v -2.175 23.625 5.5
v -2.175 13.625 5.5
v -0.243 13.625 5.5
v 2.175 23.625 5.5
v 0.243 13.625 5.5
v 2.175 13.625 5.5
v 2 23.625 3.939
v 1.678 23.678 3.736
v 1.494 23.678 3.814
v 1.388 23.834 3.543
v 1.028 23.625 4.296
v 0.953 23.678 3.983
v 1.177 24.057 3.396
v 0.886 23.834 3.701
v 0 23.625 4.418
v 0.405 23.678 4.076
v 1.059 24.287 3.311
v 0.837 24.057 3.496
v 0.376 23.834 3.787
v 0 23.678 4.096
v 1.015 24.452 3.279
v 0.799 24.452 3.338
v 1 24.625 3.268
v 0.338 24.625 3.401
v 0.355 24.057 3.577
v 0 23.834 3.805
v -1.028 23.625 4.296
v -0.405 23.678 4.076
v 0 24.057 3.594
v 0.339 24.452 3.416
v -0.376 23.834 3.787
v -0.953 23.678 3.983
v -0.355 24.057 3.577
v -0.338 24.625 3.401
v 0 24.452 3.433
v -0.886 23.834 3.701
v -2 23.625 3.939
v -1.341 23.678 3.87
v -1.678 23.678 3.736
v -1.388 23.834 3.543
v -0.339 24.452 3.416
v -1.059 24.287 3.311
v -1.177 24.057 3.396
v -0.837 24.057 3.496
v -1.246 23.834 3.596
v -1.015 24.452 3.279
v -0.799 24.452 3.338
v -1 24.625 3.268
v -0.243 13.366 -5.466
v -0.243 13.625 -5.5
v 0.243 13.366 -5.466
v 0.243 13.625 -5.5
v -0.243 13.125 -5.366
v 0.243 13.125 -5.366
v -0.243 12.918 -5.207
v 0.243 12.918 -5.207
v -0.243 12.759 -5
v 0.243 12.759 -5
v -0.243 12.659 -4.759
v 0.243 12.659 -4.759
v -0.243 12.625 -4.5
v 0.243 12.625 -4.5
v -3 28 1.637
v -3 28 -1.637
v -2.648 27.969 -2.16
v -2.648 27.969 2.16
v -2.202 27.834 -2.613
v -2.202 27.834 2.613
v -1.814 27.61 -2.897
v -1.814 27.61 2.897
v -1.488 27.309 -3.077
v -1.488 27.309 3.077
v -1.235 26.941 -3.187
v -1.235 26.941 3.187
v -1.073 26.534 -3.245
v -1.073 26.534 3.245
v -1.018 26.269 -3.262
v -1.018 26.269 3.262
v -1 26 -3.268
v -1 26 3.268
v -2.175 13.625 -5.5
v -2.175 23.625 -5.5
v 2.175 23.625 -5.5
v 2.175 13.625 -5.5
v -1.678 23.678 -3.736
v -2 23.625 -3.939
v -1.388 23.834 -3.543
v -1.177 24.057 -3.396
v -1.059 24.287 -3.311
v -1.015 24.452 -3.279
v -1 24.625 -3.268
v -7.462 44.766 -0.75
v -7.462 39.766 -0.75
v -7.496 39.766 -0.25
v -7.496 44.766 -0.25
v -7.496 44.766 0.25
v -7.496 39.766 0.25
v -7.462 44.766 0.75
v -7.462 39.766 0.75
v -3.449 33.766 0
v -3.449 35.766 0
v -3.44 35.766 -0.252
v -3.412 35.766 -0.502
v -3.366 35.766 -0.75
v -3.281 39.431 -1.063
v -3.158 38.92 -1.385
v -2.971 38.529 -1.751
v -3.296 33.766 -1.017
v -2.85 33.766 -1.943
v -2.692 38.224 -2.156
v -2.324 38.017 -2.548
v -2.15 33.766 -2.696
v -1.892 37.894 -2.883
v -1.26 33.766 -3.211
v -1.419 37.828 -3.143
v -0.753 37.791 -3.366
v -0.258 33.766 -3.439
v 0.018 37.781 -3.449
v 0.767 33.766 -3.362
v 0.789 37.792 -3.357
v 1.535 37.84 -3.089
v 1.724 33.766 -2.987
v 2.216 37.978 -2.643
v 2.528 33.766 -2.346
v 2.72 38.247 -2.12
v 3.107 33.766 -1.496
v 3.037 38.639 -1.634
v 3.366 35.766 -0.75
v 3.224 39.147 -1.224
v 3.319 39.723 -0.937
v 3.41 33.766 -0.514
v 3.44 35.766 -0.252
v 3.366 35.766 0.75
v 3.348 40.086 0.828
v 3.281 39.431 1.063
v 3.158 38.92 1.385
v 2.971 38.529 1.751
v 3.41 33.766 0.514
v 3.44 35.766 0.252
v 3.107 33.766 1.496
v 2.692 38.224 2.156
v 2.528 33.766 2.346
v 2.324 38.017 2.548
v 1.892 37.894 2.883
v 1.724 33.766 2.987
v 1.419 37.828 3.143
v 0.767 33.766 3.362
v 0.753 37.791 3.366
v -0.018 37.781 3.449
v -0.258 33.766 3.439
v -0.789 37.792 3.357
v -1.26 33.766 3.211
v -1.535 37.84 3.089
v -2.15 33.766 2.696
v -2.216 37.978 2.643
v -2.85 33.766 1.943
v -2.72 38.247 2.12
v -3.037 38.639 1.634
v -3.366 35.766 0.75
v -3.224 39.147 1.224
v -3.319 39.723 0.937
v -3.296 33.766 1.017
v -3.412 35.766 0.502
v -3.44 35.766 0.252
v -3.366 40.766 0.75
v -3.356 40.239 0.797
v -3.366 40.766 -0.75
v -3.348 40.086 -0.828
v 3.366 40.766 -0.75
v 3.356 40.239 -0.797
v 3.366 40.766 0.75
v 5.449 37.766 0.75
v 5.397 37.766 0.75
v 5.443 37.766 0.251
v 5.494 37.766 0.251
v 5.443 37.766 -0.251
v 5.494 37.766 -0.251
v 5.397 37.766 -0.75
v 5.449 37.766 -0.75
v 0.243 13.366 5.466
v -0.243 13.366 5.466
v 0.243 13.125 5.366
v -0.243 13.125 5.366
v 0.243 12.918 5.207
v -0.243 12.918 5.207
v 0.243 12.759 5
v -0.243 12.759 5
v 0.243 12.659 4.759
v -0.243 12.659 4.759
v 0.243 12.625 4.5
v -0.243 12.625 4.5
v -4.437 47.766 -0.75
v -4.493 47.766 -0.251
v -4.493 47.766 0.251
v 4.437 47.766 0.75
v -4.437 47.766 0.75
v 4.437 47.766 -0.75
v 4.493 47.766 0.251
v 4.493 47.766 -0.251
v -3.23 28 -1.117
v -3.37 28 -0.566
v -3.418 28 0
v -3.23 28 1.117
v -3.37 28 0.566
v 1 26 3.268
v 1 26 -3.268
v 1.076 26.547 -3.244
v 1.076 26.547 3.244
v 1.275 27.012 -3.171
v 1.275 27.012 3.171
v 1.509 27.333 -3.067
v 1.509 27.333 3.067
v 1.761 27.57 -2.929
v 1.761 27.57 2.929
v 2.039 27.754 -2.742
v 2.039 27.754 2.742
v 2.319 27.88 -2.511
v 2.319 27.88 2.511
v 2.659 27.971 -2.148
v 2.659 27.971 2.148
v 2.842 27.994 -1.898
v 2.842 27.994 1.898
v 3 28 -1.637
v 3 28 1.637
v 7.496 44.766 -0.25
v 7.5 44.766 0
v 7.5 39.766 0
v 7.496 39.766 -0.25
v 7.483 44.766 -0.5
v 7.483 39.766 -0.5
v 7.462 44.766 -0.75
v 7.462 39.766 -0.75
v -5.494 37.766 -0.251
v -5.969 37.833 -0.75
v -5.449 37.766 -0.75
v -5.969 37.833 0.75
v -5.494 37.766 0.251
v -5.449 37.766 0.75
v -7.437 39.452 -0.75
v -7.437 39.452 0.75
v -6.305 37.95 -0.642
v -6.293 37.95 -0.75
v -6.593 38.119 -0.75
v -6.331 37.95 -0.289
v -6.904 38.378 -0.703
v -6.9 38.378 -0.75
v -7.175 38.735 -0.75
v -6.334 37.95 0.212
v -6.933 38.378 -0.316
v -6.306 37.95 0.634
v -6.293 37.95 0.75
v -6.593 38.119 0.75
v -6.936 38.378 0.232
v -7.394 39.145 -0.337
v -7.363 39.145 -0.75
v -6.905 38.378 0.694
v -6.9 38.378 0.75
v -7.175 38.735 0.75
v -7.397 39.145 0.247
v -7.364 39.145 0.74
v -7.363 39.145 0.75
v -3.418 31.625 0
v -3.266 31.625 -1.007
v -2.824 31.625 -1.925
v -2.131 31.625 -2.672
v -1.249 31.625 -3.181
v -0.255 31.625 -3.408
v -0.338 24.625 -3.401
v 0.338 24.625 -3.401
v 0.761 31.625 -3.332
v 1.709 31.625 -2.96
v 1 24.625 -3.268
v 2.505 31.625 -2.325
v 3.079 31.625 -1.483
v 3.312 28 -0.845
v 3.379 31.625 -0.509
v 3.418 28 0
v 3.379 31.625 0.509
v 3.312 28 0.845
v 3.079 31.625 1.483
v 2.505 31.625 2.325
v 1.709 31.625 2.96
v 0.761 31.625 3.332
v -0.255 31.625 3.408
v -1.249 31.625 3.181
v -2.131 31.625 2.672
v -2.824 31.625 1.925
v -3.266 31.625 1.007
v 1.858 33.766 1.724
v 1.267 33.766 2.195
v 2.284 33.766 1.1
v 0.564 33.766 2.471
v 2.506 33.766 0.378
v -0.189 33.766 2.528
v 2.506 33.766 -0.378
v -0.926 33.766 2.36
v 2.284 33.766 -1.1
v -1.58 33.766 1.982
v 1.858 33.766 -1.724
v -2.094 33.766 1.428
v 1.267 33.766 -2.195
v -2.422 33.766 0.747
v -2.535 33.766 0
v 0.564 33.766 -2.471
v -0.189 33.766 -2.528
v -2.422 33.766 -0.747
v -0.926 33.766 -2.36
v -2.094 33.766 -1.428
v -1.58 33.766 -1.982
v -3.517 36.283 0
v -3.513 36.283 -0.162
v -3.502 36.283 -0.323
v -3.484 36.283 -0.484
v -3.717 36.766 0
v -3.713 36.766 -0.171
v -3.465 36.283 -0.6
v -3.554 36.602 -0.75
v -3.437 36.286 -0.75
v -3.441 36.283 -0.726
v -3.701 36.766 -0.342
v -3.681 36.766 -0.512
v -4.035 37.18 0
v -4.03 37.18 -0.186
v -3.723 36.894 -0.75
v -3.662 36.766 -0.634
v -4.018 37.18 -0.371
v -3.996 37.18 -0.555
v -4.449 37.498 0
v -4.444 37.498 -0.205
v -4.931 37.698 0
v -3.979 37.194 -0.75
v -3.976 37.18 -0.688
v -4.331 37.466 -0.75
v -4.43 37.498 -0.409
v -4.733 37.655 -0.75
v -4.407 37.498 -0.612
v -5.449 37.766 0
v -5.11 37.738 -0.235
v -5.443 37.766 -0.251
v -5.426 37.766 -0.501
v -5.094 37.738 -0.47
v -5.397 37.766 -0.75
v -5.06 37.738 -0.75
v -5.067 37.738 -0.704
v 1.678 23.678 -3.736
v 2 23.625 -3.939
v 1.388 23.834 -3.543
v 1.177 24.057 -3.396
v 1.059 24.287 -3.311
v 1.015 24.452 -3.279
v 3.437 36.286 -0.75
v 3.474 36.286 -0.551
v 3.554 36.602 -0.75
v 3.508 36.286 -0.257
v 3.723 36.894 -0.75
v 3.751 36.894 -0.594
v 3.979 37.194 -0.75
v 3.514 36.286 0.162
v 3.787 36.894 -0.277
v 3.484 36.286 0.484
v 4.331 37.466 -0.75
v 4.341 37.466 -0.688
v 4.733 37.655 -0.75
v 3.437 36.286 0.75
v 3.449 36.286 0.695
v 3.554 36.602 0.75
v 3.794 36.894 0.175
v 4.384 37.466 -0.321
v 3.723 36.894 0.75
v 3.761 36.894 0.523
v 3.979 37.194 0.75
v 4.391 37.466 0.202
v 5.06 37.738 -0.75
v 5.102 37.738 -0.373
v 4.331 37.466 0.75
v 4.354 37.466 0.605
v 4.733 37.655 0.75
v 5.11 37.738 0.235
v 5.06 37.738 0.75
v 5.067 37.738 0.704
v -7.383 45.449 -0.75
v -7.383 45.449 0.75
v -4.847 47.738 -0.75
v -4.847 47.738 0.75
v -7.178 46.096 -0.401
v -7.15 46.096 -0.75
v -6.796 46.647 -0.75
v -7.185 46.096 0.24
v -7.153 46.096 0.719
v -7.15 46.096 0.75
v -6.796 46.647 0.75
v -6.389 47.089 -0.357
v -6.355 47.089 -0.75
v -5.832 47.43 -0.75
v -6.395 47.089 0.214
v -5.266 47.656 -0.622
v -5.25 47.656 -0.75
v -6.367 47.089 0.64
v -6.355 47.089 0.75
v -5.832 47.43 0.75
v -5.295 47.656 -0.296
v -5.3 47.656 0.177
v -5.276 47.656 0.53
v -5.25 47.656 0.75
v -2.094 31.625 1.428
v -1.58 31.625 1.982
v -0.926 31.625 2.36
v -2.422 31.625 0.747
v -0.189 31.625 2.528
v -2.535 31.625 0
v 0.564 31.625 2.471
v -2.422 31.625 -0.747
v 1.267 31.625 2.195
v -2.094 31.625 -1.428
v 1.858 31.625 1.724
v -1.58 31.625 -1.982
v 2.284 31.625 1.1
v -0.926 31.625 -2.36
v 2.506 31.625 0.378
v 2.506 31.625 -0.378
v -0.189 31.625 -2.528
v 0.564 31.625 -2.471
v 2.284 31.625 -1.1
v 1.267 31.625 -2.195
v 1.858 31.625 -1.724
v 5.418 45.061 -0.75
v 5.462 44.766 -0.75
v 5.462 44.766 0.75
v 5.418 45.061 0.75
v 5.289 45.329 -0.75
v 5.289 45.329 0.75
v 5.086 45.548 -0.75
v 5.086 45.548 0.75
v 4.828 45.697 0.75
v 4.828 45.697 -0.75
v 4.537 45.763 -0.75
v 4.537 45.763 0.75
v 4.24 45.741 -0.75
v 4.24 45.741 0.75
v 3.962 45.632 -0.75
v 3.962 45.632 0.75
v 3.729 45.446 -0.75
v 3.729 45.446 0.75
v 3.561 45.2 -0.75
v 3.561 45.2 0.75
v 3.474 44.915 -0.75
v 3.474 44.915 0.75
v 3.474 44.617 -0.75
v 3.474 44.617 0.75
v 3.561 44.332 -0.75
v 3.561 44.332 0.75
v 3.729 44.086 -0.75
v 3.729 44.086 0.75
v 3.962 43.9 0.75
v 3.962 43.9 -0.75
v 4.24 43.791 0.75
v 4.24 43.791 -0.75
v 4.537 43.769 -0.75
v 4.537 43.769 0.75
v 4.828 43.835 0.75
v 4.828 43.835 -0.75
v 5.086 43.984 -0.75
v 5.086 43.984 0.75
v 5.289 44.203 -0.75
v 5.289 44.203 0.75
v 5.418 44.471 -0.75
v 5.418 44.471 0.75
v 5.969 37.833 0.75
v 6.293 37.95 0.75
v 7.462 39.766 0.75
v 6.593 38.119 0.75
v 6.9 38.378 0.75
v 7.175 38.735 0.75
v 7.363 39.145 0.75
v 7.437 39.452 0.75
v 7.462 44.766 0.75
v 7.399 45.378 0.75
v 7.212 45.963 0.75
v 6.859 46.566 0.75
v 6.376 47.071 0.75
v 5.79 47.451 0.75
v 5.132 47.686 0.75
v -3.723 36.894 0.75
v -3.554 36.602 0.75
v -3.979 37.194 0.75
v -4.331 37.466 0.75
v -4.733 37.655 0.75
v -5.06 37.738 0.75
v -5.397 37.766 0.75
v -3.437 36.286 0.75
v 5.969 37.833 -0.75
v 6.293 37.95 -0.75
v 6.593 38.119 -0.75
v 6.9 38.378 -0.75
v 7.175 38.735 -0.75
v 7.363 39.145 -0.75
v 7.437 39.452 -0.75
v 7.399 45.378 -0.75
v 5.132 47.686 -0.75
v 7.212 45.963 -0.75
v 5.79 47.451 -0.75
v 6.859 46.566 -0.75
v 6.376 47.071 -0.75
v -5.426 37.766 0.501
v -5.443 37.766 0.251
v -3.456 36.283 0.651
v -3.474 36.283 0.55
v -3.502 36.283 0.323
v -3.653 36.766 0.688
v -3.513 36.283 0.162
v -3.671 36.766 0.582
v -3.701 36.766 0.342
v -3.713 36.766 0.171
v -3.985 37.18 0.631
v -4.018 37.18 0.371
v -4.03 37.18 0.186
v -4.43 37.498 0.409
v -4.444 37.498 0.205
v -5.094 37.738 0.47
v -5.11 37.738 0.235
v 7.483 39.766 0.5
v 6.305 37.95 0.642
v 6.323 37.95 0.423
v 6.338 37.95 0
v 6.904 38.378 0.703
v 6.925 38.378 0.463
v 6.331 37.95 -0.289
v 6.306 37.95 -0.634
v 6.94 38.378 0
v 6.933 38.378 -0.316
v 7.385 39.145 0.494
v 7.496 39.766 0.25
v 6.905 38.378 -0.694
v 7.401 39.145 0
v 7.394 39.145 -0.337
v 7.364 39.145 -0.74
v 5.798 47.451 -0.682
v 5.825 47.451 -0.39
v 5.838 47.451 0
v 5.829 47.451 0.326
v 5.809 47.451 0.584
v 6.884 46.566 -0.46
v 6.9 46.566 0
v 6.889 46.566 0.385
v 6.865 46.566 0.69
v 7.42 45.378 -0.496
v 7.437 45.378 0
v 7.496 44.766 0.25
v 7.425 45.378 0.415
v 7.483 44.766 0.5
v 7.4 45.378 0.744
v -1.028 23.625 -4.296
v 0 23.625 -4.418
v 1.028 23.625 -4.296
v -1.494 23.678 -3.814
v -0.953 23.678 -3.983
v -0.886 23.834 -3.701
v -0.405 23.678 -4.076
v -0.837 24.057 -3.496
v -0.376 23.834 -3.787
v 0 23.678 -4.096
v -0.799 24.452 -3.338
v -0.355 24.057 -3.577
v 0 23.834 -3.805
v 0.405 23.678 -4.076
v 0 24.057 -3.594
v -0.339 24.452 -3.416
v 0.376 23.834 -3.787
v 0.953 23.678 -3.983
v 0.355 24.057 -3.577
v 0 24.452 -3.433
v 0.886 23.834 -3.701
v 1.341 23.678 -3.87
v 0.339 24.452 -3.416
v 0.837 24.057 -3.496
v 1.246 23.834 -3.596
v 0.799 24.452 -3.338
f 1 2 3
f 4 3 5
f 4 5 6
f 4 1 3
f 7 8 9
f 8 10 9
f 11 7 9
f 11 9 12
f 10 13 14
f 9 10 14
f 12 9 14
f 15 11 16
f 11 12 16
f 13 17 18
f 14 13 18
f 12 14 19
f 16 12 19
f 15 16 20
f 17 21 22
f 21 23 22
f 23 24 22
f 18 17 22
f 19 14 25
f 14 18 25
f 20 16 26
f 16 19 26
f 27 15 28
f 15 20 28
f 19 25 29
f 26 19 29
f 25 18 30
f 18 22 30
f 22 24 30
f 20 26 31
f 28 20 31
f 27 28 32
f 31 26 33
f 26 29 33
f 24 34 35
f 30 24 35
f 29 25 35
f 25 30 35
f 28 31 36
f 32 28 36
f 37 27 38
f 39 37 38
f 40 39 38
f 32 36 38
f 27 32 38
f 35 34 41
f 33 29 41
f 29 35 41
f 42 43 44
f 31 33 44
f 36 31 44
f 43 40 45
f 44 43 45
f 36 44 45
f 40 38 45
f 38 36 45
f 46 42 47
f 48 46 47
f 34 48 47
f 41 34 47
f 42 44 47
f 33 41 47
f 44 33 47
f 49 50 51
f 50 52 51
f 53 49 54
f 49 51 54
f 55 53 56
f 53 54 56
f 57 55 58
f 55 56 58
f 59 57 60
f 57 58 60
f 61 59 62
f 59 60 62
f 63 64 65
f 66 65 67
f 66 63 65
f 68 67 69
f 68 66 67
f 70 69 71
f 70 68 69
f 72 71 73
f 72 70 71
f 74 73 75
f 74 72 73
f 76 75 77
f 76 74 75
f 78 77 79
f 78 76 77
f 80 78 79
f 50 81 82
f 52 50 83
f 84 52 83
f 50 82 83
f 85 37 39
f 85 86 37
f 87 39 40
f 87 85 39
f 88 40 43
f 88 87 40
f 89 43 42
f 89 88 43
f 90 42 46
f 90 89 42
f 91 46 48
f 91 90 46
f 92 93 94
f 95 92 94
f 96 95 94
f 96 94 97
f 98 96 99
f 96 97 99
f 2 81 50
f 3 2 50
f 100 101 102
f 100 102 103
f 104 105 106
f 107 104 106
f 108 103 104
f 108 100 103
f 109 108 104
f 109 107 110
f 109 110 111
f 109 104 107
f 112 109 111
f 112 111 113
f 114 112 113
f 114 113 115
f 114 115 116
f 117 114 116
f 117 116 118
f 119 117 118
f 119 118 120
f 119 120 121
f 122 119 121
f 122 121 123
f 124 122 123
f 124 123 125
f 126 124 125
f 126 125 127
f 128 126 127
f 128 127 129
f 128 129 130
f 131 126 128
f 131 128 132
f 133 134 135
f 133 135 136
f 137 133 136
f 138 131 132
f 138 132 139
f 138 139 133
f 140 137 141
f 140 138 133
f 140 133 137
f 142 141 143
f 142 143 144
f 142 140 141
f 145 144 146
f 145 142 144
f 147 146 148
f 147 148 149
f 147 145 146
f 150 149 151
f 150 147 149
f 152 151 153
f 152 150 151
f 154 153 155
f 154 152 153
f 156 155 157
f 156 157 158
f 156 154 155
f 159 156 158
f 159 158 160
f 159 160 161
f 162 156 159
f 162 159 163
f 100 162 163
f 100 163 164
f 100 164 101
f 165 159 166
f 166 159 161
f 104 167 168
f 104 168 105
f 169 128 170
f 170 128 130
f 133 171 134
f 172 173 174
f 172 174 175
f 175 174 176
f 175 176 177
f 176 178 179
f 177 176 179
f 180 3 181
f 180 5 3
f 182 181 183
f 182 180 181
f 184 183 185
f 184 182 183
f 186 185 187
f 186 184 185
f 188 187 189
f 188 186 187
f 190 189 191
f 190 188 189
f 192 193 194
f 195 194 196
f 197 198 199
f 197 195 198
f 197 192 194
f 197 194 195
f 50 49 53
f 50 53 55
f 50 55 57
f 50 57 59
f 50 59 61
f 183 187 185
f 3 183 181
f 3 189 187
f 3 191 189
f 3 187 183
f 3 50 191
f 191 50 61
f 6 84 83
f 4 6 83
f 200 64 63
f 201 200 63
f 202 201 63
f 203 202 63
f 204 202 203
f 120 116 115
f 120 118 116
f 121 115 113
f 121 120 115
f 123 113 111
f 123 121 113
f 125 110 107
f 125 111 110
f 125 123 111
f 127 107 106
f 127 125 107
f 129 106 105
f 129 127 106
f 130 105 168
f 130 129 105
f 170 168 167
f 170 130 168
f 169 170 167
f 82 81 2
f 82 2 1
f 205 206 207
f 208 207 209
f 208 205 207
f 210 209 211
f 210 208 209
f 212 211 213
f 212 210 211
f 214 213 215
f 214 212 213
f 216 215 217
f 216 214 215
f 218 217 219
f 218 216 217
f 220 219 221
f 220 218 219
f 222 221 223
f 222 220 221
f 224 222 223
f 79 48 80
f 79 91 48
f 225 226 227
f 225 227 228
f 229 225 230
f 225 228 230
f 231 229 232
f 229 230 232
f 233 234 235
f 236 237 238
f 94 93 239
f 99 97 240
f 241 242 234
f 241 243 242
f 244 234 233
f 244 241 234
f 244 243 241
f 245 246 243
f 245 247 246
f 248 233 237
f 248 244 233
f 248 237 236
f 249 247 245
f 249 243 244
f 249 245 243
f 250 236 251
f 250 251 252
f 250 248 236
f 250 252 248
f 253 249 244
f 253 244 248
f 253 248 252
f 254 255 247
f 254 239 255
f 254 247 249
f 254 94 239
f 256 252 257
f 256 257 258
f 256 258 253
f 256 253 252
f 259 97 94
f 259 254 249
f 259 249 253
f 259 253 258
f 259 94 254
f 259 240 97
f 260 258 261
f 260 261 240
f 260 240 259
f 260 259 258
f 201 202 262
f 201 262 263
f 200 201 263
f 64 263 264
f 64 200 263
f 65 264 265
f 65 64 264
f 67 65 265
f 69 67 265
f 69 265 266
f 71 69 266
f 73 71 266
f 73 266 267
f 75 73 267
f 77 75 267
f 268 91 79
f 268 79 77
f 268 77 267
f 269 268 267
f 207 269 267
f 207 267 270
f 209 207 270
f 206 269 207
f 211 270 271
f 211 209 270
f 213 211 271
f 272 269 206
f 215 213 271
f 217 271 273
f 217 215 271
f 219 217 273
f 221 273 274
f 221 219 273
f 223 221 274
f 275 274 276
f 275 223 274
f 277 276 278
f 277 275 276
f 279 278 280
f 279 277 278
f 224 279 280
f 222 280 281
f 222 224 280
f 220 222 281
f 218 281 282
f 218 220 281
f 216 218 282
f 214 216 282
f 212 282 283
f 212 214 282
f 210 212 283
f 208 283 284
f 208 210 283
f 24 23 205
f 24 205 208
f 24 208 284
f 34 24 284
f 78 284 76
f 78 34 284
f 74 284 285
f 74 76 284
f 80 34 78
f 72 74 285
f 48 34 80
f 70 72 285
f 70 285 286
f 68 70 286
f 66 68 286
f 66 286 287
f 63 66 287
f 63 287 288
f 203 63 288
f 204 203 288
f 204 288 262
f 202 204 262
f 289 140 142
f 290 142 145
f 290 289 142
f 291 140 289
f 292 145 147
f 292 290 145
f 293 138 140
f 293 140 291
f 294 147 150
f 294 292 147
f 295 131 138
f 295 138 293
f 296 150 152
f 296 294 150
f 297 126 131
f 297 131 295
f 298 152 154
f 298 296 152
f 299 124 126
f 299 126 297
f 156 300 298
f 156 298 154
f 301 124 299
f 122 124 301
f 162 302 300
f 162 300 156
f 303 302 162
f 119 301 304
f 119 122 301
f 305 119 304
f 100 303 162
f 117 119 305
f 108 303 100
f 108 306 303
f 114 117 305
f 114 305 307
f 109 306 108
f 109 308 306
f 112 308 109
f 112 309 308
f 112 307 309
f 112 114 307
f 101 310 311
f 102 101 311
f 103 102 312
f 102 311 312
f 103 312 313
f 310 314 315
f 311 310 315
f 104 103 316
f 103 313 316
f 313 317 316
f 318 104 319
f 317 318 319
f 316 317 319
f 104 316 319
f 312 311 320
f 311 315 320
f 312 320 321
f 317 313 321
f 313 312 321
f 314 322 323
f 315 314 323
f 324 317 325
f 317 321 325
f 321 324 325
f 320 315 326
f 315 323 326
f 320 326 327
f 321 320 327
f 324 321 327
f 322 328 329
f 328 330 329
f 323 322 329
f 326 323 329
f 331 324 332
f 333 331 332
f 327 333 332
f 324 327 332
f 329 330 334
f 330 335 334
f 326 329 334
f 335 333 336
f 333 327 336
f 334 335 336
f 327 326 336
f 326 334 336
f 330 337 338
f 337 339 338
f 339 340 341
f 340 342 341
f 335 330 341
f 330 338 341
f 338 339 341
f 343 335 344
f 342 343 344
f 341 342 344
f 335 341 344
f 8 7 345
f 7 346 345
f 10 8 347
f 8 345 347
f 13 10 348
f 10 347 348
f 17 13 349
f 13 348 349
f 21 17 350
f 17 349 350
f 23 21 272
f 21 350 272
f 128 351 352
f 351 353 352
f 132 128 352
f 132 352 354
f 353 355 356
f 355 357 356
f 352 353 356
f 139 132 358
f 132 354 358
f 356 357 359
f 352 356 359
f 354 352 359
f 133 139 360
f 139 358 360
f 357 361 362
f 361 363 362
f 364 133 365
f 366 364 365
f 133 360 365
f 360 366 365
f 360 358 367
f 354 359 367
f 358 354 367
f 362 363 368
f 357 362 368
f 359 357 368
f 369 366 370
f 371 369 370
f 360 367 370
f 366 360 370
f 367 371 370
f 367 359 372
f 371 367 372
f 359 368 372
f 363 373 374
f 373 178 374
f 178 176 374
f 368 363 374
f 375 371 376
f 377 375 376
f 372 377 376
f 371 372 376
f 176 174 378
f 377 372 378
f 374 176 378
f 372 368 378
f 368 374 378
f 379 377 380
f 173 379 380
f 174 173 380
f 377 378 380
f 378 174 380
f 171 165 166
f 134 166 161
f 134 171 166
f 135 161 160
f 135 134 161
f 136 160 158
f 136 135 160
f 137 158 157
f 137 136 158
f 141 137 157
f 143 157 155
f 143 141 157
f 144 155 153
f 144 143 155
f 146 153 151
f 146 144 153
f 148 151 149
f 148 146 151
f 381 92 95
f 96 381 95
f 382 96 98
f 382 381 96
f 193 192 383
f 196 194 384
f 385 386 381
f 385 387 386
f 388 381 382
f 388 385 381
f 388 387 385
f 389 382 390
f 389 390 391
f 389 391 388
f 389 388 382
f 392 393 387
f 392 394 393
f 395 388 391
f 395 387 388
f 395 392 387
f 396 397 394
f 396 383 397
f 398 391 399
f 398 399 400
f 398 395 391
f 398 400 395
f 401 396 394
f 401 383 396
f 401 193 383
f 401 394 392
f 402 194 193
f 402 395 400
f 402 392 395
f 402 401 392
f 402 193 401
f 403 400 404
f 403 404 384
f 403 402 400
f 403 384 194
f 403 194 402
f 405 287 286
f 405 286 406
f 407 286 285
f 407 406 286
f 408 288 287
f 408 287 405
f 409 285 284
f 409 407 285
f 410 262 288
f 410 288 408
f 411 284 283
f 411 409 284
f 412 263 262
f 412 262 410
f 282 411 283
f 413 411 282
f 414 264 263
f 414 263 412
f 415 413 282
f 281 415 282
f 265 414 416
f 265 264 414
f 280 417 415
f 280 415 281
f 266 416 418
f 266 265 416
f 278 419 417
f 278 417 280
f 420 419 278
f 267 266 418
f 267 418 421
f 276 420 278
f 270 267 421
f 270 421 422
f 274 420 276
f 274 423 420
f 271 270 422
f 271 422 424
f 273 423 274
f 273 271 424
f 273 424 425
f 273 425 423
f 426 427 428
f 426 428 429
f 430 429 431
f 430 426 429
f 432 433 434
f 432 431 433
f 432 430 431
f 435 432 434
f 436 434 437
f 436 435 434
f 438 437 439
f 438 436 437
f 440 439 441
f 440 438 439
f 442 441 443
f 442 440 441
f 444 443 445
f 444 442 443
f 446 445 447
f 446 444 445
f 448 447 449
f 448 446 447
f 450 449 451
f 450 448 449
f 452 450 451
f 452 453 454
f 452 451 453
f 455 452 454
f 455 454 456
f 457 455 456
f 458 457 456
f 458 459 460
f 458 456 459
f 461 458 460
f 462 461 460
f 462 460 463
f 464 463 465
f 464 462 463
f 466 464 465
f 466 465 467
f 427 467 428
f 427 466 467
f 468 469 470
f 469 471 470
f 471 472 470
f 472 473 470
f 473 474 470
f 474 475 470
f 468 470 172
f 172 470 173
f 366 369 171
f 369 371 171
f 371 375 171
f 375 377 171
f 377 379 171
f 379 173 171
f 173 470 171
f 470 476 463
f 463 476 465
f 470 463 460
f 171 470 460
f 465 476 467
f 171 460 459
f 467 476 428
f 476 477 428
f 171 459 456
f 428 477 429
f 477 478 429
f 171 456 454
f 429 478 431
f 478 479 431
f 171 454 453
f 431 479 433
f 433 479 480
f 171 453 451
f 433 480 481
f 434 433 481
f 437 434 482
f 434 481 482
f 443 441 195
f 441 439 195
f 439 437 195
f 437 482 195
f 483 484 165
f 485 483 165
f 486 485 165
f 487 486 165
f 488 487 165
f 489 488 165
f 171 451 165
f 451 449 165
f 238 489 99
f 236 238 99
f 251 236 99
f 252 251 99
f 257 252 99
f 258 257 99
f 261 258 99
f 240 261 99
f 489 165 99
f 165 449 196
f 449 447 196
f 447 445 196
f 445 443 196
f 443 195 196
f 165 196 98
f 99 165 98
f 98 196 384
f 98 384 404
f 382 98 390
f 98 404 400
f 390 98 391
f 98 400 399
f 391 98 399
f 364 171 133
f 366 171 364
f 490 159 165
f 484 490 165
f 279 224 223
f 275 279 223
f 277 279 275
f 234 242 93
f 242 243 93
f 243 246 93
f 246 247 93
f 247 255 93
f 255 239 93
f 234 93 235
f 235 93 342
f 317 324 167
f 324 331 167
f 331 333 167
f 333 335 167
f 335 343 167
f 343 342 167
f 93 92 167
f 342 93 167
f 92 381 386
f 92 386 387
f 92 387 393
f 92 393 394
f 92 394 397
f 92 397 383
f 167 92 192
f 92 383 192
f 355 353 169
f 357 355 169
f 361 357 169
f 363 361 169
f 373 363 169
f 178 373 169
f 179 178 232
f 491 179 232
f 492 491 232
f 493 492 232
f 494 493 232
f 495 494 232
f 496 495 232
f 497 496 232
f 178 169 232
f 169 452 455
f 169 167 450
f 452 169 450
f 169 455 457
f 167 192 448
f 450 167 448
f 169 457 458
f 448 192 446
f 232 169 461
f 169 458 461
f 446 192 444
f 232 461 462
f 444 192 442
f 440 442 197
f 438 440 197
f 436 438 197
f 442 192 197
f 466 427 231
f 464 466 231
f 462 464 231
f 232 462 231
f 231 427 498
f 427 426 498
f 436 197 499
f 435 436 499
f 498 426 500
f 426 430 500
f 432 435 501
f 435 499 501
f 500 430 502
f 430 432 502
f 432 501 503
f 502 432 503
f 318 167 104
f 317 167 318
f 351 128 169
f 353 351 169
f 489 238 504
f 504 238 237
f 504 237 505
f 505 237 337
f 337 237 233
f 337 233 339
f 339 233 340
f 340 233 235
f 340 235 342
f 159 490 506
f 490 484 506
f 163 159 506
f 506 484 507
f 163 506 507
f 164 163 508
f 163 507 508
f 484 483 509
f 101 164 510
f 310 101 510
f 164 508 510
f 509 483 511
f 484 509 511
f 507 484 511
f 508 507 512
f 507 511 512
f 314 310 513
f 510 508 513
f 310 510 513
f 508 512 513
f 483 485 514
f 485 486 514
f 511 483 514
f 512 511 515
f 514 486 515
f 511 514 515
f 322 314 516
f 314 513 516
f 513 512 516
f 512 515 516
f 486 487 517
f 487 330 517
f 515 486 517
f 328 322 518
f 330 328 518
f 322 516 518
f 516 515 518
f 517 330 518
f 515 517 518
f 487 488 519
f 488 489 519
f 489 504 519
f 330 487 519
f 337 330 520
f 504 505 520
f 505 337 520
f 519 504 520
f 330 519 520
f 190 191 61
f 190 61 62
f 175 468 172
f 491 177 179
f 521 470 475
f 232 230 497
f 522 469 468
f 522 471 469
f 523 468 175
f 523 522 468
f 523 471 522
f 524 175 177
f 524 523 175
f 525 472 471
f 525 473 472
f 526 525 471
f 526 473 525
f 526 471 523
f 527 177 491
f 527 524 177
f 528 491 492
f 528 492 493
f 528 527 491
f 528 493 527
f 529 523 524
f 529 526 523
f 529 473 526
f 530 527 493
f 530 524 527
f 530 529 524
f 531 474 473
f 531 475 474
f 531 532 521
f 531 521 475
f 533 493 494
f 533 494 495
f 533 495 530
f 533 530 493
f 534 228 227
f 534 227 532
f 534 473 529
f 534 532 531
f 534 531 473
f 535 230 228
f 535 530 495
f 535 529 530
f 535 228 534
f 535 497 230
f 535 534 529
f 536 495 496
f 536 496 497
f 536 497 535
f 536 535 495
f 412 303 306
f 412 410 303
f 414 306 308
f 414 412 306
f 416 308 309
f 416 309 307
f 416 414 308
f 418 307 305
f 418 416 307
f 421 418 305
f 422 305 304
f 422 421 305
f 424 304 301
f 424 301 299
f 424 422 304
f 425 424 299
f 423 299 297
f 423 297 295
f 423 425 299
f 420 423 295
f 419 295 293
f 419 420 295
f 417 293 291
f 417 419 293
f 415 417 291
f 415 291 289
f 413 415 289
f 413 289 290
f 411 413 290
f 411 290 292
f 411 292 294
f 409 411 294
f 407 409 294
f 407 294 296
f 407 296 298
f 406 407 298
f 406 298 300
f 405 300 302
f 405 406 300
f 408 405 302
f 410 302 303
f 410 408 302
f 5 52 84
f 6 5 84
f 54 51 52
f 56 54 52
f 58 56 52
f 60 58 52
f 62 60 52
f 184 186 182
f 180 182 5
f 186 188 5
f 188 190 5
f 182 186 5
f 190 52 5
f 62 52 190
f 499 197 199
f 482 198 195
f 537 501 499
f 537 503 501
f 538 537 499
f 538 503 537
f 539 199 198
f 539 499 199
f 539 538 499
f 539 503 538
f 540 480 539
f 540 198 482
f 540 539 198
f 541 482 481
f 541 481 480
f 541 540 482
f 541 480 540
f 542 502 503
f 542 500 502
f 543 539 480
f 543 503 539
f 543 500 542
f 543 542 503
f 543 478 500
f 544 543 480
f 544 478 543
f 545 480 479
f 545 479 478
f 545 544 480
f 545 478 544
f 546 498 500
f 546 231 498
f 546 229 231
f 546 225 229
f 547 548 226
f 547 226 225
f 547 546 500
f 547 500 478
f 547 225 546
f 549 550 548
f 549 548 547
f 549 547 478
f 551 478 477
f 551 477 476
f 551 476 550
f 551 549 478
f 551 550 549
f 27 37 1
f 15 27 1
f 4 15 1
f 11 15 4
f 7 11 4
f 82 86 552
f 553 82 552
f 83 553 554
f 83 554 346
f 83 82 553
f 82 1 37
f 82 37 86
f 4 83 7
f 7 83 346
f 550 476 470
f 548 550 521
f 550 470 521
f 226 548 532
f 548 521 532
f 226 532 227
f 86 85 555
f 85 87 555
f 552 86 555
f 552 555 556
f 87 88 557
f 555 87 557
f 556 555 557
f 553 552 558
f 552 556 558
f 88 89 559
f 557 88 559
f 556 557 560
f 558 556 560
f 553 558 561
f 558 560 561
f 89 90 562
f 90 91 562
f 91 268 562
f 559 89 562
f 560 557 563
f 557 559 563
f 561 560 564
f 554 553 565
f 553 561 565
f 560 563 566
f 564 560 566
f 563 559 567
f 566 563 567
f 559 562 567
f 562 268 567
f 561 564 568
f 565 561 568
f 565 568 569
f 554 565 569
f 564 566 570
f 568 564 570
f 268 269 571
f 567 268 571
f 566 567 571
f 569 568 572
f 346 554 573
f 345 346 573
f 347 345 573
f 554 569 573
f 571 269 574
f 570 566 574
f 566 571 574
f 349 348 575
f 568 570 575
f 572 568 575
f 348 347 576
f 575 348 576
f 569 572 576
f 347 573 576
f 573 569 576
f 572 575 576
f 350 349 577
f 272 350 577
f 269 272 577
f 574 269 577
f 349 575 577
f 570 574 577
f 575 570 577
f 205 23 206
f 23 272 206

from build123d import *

# Parameters (mm, degrees)
BOSS_EXTRUDE1_DEPTH      = 10
FILLET2_R                = 2
FILLET3_R                = 3
CUT_EXTRUDE1_DEPTH       = 49.473897211
CUT_EXTRUDE1_DEPTH_BACK  = 49.473897211
SKETCH3_R                = 1
CUT_EXTRUDE2_DEPTH       = 49.473897211
CUT_EXTRUDE2_DEPTH_BACK  = 49.473897211
SKETCH4_W                = 5.555619824
SKETCH4_H                = 11.886700215
SKETCH4_W_2              = 4.837610552
SKETCH4_H_2              = 13.886700215
FILLET4_R                = 2
BOSS_EXTRUDE2_DEPTH      = 5.5
BOSS_EXTRUDE2_DEPTH_BACK = 5.5
SKETCH7_W                = 4.35
SKETCH7_H                = 10
FILLET5_R                = 1
SKETCH8_W                = 0.486068648
SKETCH8_H                = 11
BOSS_EXTRUDE3_DEPTH      = 1
FILLET6_R                = 1


with BuildPart() as part:
    # Sketch1 → Revolve1 (revolve)
    with BuildSketch(Plane.XY):
        Polygon((-3.448914015, 37.765821371), (-3.448914015, 33.765821371), (-2.534753992, 33.765821371), (-2.534753992, 31.624967984), (-3.41766068, 31.624967984), (-3.41766068, 23), (0, 23), (0, 37.765821371), align=None)
    revolve(axis=Axis((0, 37.765821371, 0), (0, -1, 0)))

    # Sketch2 → Boss-Extrude1 (add)
    with BuildSketch(Plane(origin=(0, 37.765821371, 0), x_dir=(1, 0, 0), z_dir=(0, 1, 0))):
        with BuildLine():
            Line((3.366379046, 0.75), (-3.366379046, 0.75))
            ThreePointArc((-3.366379046, 0.75), (-3.448914015, 0), (-3.366379046, -0.75))
            Line((-3.366379046, -0.75), (3.366379046, -0.75))
            ThreePointArc((3.366379046, -0.75), (3.428218178, -0.37726384), (3.448914015, 0))
            ThreePointArc((3.448914015, 0), (3.428218178, 0.37726384), (3.366379046, 0.75))
        make_face()
        with BuildLine():
            Line((-3.366379046, 0.75), (-7.462405778, 0.75))
            ThreePointArc((-7.462405778, 0.75), (-7.5, 0), (-7.462405778, -0.75))
            Line((-7.462405778, -0.75), (-3.366379046, -0.75))
            ThreePointArc((-3.366379046, -0.75), (-3.448914015, 0), (-3.366379046, 0.75))
        make_face()
        with BuildLine():
            ThreePointArc((7.5, 0), (7.490595548, 0.375470813), (7.462405778, 0.75))
            Line((7.462405778, 0.75), (3.366379046, 0.75))
            ThreePointArc((3.366379046, 0.75), (3.428218178, 0.37726384), (3.448914015, 0))
            ThreePointArc((3.448914015, 0), (3.428218178, -0.37726384), (3.366379046, -0.75))
            Line((3.366379046, -0.75), (7.462405778, -0.75))
            ThreePointArc((7.462405778, -0.75), (7.490595548, -0.375470813), (7.5, 0))
        make_face()
    extrude(amount=BOSS_EXTRUDE1_DEPTH)

    # Fillet2
    # the kernel refuses this fillet: 2 mm, written as the material it adds along each edge
    with BuildSketch(Plane(origin=(0, 37.765821371, 0), x_dir=(-0.09803421101524086, 0, -0.9951830452085783), z_dir=(-0.9951830452085783, 0, 0.09803421101524086))) as fillet2_piece_1_section:
        with BuildLine():
            CenterArc((3.448914015 + FILLET2_R, FILLET2_R), FILLET2_R, 180, 90)
            Line((3.448914015 + FILLET2_R, 0), (3.448914015, 0))
            Line((3.448914015, 0), (3.448914015, FILLET2_R))
        make_face()
    fillet2_piece_1 = revolve(axis=Axis((0, 37.765821371, 0), (0, -1, 0)), revolution_arc=191.251965623, mode=Mode.PRIVATE)
    fillet2_piece_1 = split(fillet2_piece_1, bisect_by=Plane(origin=(3.870689991, 37.318827735, -0.75), z_dir=(0, 0, 1)), keep=Keep.TOP, mode=Mode.PRIVATE)
    fillet2_piece_1 = split(fillet2_piece_1, bisect_by=Plane(origin=(3.870689991, 37.318827735, 0.75), z_dir=(0, 0, -1)), keep=Keep.TOP, mode=Mode.PRIVATE)
    add(fillet2_piece_1)
    with BuildSketch(Plane(origin=(0, 37.765821371, 0), x_dir=(0.09800035789508027, 0, 0.9951863794548418), z_dir=(0.9951863794548418, 0, -0.09800035789508027))) as fillet2_piece_2_section:
        with BuildLine():
            CenterArc((3.448914015 + FILLET2_R, FILLET2_R), FILLET2_R, 180, 90)
            Line((3.448914015 + FILLET2_R, 0), (3.448914015, 0))
            Line((3.448914015, 0), (3.448914015, FILLET2_R))
        make_face()
    fillet2_piece_2 = revolve(axis=Axis((0, 37.765821371, 0), (0, -1, 0)), revolution_arc=95.624033786, mode=Mode.PRIVATE)
    fillet2_piece_2 = split(fillet2_piece_2, bisect_by=Plane(origin=(-3.870690025, 37.318827894, 0.75), z_dir=(0, 0, -1)), keep=Keep.TOP, mode=Mode.PRIVATE)
    add(fillet2_piece_2)
    with BuildSketch(Plane(origin=(0, 37.765821371, 0), x_dir=(-1, 0, 0), z_dir=(0, 0, 1))) as fillet2_piece_3_section:
        with BuildLine():
            CenterArc((3.448914015 + FILLET2_R, FILLET2_R), FILLET2_R, 180, 90)
            Line((3.448914015 + FILLET2_R, 0), (3.448914015, 0))
            Line((3.448914015, 0), (3.448914015, FILLET2_R))
        make_face()
    fillet2_piece_3 = revolve(axis=Axis((0, 37.765821371, 0), (0, -1, 0)), revolution_arc=95.624033786, mode=Mode.PRIVATE)
    fillet2_piece_3 = split(fillet2_piece_3, bisect_by=Plane(origin=(-3.870689874, 37.318828004, -0.75), z_dir=(0, 0, 1)), keep=Keep.TOP, mode=Mode.PRIVATE)
    add(fillet2_piece_3)
    # the kernel refuses this fillet: 2 mm, written as the material it takes off along each edge
    with BuildSketch(Plane(origin=(0, 37.765821371, 0), x_dir=(-0.7201079494948177, 0, -0.6938620475817721), z_dir=(0.6938620475817721, 0, -0.7201079494948177))) as fillet2_2_piece_1:
        with BuildLine():
            CenterArc((7.5 - FILLET2_R, FILLET2_R), FILLET2_R, 270, 90)
            Line((7.5, FILLET2_R), (7.5, 0))
            Line((7.5, 0), (7.5 - FILLET2_R, 0))
        make_face()
    revolve(axis=Axis((0, 37.765821371, 0), (0, 1, 0)), revolution_arc=87.873212667, mode=Mode.SUBTRACT)
    with BuildSketch(Plane(origin=(0, 37.765821371, 0), x_dir=(0.7201079494948216, 0, 0.6938620475817678), z_dir=(-0.6938620475817678, 0, 0.7201079494948216))) as fillet2_2_piece_2:
        with BuildLine():
            CenterArc((7.5 - FILLET2_R, FILLET2_R), FILLET2_R, 270, 90)
            Line((7.5 - FILLET2_R, 0), (7.5, 0))
            Line((7.5, 0), (7.5, FILLET2_R))
        make_face()
    revolve(axis=Axis((0, 37.765821371, 0), (0, 1, 0)), revolution_arc=87.873212667, mode=Mode.SUBTRACT)

    # Fillet3
    # the kernel refuses this fillet: 3 mm, written as the material it adds along each edge
    with BuildSketch(Plane(origin=(10.866379046, 37.765821371, -0.75), x_dir=(0, 1, 0), z_dir=(-1, 0, 0))) as fillet3_piece_1_section:
        with BuildLine():
            CenterArc((FILLET3_R, FILLET3_R), FILLET3_R, 180, 90)
            Line((0, FILLET3_R), (0, 0))
            Line((0, 0), (FILLET3_R, 0))
        make_face()
    fillet3_piece_1 = extrude(amount=21.732758092, mode=Mode.PRIVATE)
    fillet3_piece_1 = fillet3_piece_1 & Plane(origin=(0, 38.470226203, 0), x_dir=(-1, 0, 0), z_dir=(0, -1, 0)) * Cylinder(3.448914015, 56, mode=Mode.PRIVATE)
    add(fillet3_piece_1)
    with BuildSketch(Plane(origin=(10.866379046, 37.765821371, 0.75), x_dir=(0, 1, 0), z_dir=(-1, 0, 0))) as fillet3_piece_2_section:
        with BuildLine():
            CenterArc((FILLET3_R, -FILLET3_R), FILLET3_R, 90, 90)
            Line((0, -FILLET3_R), (0, 0))
            Line((0, 0), (FILLET3_R, 0))
        make_face()
    fillet3_piece_2 = extrude(amount=21.732758092, mode=Mode.PRIVATE)
    fillet3_piece_2 = fillet3_piece_2 & Plane(origin=(0, 38.470226203, 0), x_dir=(-1, 0, 0), z_dir=(0, -1, 0)) * Cylinder(3.448914015, 56, mode=Mode.PRIVATE)
    add(fillet3_piece_2)
    # the kernel refuses this fillet: 3 mm, written as the material it takes off along each edge
    with BuildSketch(Plane(origin=(0, 47.765821371, 0), x_dir=(-0.4534410859899706, 0, -0.8912862511764871), z_dir=(0.8912862511764871, 0, -0.4534410859899706))) as fillet3_2_piece_1:
        with BuildLine():
            CenterArc((7.5 - FILLET3_R, -FILLET3_R), FILLET3_R, 0, 90)
            Line((7.5 - FILLET3_R, 0), (7.5, 0))
            Line((7.5, 0), (7.5, -FILLET3_R))
        make_face()
    revolve(axis=Axis((0, 47.765821371, 0), (0, 1, 0)), revolution_arc=126.070648523, mode=Mode.SUBTRACT)
    with BuildSketch(Plane(origin=(0, 47.765821371, 0), x_dir=(0.4534410859901425, 0, -0.8912862511763997), z_dir=(-0.8912862511763997, 0, -0.4534410859901425))) as fillet3_2_piece_2:
        with BuildLine():
            CenterArc((7.5 - FILLET3_R, FILLET3_R), FILLET3_R, 270, 90)
            Line((7.5, FILLET3_R), (7.5, 0))
            Line((7.5, 0), (7.5 - FILLET3_R, 0))
        make_face()
    revolve(axis=Axis((0, 47.765821371, 0), (0, -1, 0)), revolution_arc=126.070648523, mode=Mode.SUBTRACT)

    # Sketch3 → Cut-Extrude1 (cut, two sides: drawn at the far end of the back side and taken through both)
    with BuildSketch(Plane.XY.offset(-CUT_EXTRUDE1_DEPTH_BACK)):
        with Locations((4.462405778, 44.765821371)):
            Circle(SKETCH3_R)
    extrude(amount=CUT_EXTRUDE1_DEPTH + CUT_EXTRUDE1_DEPTH_BACK, mode=Mode.SUBTRACT)

    # Sketch4 → Cut-Extrude2 (cut, two sides: drawn at the far end of the back side and taken through both)
    with BuildSketch(Plane.XY.offset(-CUT_EXTRUDE2_DEPTH_BACK)):
        with Locations((-3.777809912, 22.056649893)):
            Rectangle(SKETCH4_W, SKETCH4_H)
        with Locations((3.418805276, 21.056649893)):
            Rectangle(SKETCH4_W_2, SKETCH4_H_2)
    extrude(amount=CUT_EXTRUDE2_DEPTH + CUT_EXTRUDE2_DEPTH_BACK, mode=Mode.SUBTRACT)

    # Fillet4
    fillet4_edges = [part.edges().sort_by_distance(p)[0] for p in [
        (-1, 28, 0),
        (1, 28, 0),
    ]]
    fillet(fillet4_edges, radius=FILLET4_R)

    # Sketch7 → Boss-Extrude2 (add, two sides: drawn at the far end of the back side and taken through both)
    with BuildSketch(Plane.XY.offset(-BOSS_EXTRUDE2_DEPTH_BACK)):
        with Locations((0, 18.624967984)):
            Rectangle(SKETCH7_W, SKETCH7_H)
    extrude(amount=BOSS_EXTRUDE2_DEPTH + BOSS_EXTRUDE2_DEPTH_BACK)

    # Fillet5
    fillet5_edges = [part.edges().sort_by_distance(p)[0] for p in [
        (1, 23.624967984, 0),
        (0, 23.624967984, -3.41766068),
        (0, 23.624967984, 3.41766068),
        (-1, 23.624967984, 0),
    ]]
    fillet(fillet5_edges, radius=FILLET5_R)

    # Sketch8 → Boss-Extrude3 (add)
    with BuildSketch(Plane.XZ.offset(-13.624967984)):
        Rectangle(SKETCH8_W, SKETCH8_H)
    extrude(amount=BOSS_EXTRUDE3_DEPTH)

    # Fillet6
    fillet6_edges = [part.edges().sort_by_distance(p)[0] for p in [
        (0, 12.624967984, -5.5),
        (0, 12.624967984, 5.5),
    ]]
    fillet(fillet6_edges, radius=FILLET6_R)


solid = part.part
